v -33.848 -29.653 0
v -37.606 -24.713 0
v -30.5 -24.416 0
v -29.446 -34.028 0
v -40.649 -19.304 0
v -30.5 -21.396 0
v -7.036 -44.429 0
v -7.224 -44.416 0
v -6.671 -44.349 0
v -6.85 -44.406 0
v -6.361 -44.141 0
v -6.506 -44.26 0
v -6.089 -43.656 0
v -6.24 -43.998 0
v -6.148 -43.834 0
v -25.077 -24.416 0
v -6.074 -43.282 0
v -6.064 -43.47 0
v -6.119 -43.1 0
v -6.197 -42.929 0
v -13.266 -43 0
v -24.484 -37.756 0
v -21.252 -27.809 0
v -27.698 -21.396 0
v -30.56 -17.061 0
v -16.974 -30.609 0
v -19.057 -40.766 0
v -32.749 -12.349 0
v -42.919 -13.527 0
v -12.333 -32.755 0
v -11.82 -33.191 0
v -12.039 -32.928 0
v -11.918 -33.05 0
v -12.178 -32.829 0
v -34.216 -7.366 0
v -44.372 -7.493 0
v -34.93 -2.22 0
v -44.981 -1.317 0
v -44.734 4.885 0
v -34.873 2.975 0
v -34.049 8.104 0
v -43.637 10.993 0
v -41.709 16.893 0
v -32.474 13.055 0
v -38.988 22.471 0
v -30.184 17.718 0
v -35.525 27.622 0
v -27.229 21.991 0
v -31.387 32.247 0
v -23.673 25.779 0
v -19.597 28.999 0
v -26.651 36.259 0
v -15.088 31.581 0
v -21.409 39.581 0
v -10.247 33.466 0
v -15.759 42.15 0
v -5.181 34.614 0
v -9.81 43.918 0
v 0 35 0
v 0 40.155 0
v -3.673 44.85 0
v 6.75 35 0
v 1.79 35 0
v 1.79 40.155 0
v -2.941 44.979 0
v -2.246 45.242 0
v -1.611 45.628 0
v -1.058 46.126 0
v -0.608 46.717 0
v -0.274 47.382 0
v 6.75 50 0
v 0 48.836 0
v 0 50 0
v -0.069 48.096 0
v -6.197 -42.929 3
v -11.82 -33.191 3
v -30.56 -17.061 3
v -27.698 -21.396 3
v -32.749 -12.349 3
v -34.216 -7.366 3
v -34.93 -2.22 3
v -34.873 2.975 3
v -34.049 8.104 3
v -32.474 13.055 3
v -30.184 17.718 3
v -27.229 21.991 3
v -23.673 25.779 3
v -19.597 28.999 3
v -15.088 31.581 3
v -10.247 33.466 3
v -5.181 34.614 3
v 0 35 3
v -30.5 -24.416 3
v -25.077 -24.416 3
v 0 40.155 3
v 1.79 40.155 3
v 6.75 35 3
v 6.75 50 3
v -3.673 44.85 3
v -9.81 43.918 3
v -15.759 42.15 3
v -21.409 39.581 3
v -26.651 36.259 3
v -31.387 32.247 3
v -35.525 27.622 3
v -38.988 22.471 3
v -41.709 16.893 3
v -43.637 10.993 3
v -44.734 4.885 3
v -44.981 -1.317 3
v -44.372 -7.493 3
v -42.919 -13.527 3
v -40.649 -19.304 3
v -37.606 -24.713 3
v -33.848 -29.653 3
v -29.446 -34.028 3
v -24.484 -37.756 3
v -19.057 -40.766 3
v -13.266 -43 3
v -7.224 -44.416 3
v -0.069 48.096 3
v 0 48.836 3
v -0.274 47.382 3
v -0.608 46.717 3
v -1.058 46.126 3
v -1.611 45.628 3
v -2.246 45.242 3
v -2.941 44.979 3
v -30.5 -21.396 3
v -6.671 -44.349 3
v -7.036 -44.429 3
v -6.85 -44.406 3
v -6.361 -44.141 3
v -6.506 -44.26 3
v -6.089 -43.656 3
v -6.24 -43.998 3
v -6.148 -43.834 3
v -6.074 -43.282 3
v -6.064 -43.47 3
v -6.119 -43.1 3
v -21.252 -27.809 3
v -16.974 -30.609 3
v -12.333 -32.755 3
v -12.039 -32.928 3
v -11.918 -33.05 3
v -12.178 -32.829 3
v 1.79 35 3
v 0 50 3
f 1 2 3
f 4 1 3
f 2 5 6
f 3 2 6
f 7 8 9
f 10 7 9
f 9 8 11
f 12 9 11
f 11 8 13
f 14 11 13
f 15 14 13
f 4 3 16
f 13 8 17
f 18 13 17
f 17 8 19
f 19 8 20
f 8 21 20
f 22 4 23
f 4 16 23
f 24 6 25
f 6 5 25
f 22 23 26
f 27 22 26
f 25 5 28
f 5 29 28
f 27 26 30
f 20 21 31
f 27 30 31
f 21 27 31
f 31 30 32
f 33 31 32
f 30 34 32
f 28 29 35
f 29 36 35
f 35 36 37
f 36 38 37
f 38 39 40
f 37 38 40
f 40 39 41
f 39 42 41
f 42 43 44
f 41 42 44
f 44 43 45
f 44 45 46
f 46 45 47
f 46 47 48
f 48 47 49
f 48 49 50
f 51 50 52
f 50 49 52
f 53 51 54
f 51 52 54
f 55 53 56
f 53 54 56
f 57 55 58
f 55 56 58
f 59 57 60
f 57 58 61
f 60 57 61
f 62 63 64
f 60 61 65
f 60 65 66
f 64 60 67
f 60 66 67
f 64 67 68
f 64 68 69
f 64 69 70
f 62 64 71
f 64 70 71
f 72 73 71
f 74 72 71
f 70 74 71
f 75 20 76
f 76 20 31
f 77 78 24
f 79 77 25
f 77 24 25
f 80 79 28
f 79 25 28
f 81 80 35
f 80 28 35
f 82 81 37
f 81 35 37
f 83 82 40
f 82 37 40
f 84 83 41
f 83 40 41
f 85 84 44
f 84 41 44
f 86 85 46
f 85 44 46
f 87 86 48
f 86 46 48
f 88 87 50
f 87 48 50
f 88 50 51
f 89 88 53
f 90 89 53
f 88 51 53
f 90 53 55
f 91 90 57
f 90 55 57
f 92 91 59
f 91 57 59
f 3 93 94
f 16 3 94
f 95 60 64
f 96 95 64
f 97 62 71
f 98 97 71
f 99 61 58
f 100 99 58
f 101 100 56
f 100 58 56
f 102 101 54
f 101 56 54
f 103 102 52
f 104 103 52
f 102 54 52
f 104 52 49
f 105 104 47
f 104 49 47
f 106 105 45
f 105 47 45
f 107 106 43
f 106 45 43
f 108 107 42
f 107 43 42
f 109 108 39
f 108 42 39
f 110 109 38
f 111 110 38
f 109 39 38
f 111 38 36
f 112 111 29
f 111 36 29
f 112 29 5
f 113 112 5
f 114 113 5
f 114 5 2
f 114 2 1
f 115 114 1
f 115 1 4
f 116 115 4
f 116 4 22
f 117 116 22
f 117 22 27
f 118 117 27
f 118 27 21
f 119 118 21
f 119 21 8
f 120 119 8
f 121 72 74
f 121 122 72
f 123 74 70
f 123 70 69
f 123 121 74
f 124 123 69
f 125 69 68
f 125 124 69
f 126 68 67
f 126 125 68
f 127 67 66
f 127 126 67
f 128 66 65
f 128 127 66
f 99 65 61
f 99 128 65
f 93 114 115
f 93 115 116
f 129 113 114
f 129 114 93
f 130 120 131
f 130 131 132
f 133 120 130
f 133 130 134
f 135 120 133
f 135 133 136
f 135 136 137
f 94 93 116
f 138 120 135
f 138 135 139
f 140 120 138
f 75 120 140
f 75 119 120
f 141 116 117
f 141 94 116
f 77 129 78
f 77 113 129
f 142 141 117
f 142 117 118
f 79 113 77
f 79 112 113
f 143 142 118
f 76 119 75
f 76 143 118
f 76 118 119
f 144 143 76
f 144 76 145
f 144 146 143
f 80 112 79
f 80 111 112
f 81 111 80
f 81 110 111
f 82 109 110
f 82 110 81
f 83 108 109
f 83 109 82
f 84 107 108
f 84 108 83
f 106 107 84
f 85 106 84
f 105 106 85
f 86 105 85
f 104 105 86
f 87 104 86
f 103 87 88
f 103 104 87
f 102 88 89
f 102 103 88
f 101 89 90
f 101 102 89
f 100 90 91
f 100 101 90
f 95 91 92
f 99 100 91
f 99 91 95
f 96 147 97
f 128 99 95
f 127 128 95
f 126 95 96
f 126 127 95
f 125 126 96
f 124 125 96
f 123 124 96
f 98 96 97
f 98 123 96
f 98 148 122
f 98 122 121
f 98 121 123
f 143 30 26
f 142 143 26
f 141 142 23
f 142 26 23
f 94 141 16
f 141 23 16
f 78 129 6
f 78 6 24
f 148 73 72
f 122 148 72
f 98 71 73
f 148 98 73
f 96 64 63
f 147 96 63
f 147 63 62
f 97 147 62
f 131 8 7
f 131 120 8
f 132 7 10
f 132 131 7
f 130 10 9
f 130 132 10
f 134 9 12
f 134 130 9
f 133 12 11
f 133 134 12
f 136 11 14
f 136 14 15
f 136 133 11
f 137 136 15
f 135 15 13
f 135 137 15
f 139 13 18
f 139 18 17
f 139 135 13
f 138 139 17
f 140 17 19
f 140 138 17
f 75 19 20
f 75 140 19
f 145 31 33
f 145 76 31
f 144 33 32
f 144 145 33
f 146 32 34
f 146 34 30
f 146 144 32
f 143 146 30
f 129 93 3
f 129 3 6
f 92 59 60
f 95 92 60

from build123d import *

# Parameters (mm, degrees)
BOSS_EXTRUDE1_DEPTH = 3
FILLET1_R           = 4
FILLET2_R           = 1
FILLET3_R           = 1
SKETCH2_W           = 68.766076313
SKETCH2_H           = 3.02
CUT_EXTRUDE3_DEPTH  = 10
SKETCH3_W           = 3.5
SKETCH3_H           = 3.02
BOSS_EXTRUDE2_DEPTH = 3


with BuildPart() as part:
    # Sketch1 → Boss-Extrude1 (new body)
    with BuildSketch(Plane.XY):
        with BuildLine():
            Line((0, 35), (0, 40.154947939))
            Line((0, 40.154947939), (1.79, 40.154947939))
            Line((1.79, 40.154947939), (1.79, 35))
            Line((1.79, 35), (6.75, 35))
            Line((6.75, 35), (6.75, 50))
            Line((6.75, 50), (0, 50))
            Line((0, 50), (0, 45))
            ThreePointArc((0, 45), (-44.925333381, 2.591219899), (-5.173840791, -44.701581308))
            Line((-5.173840791, -44.701581308), (-11.99982612, -32.878627908))
            ThreePointArc((-11.99982612, -32.878627908), (-34.465576861, 6.092947695), (0, 35))
        make_face()
    extrude(amount=BOSS_EXTRUDE1_DEPTH)

    # Fillet1
    fillet1_edges = [part.edges().sort_by_distance(p)[0] for p in [
        (0, 45, 1.5),
    ]]
    fillet(fillet1_edges, radius=FILLET1_R)

    # Fillet2
    fillet2_edges = [part.edges().sort_by_distance(p)[0] for p in [
        (-5.173840791, -44.701581308, 1.5),
    ]]
    fillet(fillet2_edges, radius=FILLET2_R)

    # Fillet3
    fillet3_edges = [part.edges().sort_by_distance(p)[0] for p in [
        (-11.99982612, -32.878627908, 1.5),
    ]]
    fillet(fillet3_edges, radius=FILLET3_R)

    # Sketch2 → Cut-Extrude3 (cut)
    with BuildSketch(Plane.XY.offset(3)):
        with Locations((0.383038156, -22.906441492)):
            Rectangle(SKETCH2_W, SKETCH2_H)
    extrude(amount=-CUT_EXTRUDE3_DEPTH, mode=Mode.SUBTRACT)

    # Sketch3 → Boss-Extrude2 (add)
    with BuildSketch(Plane.XY.offset(3)):
        with Locations((-32.25, -22.906441492)):
            Rectangle(SKETCH3_W, SKETCH3_H)
    extrude(amount=-BOSS_EXTRUDE2_DEPTH)


solid = part.part
